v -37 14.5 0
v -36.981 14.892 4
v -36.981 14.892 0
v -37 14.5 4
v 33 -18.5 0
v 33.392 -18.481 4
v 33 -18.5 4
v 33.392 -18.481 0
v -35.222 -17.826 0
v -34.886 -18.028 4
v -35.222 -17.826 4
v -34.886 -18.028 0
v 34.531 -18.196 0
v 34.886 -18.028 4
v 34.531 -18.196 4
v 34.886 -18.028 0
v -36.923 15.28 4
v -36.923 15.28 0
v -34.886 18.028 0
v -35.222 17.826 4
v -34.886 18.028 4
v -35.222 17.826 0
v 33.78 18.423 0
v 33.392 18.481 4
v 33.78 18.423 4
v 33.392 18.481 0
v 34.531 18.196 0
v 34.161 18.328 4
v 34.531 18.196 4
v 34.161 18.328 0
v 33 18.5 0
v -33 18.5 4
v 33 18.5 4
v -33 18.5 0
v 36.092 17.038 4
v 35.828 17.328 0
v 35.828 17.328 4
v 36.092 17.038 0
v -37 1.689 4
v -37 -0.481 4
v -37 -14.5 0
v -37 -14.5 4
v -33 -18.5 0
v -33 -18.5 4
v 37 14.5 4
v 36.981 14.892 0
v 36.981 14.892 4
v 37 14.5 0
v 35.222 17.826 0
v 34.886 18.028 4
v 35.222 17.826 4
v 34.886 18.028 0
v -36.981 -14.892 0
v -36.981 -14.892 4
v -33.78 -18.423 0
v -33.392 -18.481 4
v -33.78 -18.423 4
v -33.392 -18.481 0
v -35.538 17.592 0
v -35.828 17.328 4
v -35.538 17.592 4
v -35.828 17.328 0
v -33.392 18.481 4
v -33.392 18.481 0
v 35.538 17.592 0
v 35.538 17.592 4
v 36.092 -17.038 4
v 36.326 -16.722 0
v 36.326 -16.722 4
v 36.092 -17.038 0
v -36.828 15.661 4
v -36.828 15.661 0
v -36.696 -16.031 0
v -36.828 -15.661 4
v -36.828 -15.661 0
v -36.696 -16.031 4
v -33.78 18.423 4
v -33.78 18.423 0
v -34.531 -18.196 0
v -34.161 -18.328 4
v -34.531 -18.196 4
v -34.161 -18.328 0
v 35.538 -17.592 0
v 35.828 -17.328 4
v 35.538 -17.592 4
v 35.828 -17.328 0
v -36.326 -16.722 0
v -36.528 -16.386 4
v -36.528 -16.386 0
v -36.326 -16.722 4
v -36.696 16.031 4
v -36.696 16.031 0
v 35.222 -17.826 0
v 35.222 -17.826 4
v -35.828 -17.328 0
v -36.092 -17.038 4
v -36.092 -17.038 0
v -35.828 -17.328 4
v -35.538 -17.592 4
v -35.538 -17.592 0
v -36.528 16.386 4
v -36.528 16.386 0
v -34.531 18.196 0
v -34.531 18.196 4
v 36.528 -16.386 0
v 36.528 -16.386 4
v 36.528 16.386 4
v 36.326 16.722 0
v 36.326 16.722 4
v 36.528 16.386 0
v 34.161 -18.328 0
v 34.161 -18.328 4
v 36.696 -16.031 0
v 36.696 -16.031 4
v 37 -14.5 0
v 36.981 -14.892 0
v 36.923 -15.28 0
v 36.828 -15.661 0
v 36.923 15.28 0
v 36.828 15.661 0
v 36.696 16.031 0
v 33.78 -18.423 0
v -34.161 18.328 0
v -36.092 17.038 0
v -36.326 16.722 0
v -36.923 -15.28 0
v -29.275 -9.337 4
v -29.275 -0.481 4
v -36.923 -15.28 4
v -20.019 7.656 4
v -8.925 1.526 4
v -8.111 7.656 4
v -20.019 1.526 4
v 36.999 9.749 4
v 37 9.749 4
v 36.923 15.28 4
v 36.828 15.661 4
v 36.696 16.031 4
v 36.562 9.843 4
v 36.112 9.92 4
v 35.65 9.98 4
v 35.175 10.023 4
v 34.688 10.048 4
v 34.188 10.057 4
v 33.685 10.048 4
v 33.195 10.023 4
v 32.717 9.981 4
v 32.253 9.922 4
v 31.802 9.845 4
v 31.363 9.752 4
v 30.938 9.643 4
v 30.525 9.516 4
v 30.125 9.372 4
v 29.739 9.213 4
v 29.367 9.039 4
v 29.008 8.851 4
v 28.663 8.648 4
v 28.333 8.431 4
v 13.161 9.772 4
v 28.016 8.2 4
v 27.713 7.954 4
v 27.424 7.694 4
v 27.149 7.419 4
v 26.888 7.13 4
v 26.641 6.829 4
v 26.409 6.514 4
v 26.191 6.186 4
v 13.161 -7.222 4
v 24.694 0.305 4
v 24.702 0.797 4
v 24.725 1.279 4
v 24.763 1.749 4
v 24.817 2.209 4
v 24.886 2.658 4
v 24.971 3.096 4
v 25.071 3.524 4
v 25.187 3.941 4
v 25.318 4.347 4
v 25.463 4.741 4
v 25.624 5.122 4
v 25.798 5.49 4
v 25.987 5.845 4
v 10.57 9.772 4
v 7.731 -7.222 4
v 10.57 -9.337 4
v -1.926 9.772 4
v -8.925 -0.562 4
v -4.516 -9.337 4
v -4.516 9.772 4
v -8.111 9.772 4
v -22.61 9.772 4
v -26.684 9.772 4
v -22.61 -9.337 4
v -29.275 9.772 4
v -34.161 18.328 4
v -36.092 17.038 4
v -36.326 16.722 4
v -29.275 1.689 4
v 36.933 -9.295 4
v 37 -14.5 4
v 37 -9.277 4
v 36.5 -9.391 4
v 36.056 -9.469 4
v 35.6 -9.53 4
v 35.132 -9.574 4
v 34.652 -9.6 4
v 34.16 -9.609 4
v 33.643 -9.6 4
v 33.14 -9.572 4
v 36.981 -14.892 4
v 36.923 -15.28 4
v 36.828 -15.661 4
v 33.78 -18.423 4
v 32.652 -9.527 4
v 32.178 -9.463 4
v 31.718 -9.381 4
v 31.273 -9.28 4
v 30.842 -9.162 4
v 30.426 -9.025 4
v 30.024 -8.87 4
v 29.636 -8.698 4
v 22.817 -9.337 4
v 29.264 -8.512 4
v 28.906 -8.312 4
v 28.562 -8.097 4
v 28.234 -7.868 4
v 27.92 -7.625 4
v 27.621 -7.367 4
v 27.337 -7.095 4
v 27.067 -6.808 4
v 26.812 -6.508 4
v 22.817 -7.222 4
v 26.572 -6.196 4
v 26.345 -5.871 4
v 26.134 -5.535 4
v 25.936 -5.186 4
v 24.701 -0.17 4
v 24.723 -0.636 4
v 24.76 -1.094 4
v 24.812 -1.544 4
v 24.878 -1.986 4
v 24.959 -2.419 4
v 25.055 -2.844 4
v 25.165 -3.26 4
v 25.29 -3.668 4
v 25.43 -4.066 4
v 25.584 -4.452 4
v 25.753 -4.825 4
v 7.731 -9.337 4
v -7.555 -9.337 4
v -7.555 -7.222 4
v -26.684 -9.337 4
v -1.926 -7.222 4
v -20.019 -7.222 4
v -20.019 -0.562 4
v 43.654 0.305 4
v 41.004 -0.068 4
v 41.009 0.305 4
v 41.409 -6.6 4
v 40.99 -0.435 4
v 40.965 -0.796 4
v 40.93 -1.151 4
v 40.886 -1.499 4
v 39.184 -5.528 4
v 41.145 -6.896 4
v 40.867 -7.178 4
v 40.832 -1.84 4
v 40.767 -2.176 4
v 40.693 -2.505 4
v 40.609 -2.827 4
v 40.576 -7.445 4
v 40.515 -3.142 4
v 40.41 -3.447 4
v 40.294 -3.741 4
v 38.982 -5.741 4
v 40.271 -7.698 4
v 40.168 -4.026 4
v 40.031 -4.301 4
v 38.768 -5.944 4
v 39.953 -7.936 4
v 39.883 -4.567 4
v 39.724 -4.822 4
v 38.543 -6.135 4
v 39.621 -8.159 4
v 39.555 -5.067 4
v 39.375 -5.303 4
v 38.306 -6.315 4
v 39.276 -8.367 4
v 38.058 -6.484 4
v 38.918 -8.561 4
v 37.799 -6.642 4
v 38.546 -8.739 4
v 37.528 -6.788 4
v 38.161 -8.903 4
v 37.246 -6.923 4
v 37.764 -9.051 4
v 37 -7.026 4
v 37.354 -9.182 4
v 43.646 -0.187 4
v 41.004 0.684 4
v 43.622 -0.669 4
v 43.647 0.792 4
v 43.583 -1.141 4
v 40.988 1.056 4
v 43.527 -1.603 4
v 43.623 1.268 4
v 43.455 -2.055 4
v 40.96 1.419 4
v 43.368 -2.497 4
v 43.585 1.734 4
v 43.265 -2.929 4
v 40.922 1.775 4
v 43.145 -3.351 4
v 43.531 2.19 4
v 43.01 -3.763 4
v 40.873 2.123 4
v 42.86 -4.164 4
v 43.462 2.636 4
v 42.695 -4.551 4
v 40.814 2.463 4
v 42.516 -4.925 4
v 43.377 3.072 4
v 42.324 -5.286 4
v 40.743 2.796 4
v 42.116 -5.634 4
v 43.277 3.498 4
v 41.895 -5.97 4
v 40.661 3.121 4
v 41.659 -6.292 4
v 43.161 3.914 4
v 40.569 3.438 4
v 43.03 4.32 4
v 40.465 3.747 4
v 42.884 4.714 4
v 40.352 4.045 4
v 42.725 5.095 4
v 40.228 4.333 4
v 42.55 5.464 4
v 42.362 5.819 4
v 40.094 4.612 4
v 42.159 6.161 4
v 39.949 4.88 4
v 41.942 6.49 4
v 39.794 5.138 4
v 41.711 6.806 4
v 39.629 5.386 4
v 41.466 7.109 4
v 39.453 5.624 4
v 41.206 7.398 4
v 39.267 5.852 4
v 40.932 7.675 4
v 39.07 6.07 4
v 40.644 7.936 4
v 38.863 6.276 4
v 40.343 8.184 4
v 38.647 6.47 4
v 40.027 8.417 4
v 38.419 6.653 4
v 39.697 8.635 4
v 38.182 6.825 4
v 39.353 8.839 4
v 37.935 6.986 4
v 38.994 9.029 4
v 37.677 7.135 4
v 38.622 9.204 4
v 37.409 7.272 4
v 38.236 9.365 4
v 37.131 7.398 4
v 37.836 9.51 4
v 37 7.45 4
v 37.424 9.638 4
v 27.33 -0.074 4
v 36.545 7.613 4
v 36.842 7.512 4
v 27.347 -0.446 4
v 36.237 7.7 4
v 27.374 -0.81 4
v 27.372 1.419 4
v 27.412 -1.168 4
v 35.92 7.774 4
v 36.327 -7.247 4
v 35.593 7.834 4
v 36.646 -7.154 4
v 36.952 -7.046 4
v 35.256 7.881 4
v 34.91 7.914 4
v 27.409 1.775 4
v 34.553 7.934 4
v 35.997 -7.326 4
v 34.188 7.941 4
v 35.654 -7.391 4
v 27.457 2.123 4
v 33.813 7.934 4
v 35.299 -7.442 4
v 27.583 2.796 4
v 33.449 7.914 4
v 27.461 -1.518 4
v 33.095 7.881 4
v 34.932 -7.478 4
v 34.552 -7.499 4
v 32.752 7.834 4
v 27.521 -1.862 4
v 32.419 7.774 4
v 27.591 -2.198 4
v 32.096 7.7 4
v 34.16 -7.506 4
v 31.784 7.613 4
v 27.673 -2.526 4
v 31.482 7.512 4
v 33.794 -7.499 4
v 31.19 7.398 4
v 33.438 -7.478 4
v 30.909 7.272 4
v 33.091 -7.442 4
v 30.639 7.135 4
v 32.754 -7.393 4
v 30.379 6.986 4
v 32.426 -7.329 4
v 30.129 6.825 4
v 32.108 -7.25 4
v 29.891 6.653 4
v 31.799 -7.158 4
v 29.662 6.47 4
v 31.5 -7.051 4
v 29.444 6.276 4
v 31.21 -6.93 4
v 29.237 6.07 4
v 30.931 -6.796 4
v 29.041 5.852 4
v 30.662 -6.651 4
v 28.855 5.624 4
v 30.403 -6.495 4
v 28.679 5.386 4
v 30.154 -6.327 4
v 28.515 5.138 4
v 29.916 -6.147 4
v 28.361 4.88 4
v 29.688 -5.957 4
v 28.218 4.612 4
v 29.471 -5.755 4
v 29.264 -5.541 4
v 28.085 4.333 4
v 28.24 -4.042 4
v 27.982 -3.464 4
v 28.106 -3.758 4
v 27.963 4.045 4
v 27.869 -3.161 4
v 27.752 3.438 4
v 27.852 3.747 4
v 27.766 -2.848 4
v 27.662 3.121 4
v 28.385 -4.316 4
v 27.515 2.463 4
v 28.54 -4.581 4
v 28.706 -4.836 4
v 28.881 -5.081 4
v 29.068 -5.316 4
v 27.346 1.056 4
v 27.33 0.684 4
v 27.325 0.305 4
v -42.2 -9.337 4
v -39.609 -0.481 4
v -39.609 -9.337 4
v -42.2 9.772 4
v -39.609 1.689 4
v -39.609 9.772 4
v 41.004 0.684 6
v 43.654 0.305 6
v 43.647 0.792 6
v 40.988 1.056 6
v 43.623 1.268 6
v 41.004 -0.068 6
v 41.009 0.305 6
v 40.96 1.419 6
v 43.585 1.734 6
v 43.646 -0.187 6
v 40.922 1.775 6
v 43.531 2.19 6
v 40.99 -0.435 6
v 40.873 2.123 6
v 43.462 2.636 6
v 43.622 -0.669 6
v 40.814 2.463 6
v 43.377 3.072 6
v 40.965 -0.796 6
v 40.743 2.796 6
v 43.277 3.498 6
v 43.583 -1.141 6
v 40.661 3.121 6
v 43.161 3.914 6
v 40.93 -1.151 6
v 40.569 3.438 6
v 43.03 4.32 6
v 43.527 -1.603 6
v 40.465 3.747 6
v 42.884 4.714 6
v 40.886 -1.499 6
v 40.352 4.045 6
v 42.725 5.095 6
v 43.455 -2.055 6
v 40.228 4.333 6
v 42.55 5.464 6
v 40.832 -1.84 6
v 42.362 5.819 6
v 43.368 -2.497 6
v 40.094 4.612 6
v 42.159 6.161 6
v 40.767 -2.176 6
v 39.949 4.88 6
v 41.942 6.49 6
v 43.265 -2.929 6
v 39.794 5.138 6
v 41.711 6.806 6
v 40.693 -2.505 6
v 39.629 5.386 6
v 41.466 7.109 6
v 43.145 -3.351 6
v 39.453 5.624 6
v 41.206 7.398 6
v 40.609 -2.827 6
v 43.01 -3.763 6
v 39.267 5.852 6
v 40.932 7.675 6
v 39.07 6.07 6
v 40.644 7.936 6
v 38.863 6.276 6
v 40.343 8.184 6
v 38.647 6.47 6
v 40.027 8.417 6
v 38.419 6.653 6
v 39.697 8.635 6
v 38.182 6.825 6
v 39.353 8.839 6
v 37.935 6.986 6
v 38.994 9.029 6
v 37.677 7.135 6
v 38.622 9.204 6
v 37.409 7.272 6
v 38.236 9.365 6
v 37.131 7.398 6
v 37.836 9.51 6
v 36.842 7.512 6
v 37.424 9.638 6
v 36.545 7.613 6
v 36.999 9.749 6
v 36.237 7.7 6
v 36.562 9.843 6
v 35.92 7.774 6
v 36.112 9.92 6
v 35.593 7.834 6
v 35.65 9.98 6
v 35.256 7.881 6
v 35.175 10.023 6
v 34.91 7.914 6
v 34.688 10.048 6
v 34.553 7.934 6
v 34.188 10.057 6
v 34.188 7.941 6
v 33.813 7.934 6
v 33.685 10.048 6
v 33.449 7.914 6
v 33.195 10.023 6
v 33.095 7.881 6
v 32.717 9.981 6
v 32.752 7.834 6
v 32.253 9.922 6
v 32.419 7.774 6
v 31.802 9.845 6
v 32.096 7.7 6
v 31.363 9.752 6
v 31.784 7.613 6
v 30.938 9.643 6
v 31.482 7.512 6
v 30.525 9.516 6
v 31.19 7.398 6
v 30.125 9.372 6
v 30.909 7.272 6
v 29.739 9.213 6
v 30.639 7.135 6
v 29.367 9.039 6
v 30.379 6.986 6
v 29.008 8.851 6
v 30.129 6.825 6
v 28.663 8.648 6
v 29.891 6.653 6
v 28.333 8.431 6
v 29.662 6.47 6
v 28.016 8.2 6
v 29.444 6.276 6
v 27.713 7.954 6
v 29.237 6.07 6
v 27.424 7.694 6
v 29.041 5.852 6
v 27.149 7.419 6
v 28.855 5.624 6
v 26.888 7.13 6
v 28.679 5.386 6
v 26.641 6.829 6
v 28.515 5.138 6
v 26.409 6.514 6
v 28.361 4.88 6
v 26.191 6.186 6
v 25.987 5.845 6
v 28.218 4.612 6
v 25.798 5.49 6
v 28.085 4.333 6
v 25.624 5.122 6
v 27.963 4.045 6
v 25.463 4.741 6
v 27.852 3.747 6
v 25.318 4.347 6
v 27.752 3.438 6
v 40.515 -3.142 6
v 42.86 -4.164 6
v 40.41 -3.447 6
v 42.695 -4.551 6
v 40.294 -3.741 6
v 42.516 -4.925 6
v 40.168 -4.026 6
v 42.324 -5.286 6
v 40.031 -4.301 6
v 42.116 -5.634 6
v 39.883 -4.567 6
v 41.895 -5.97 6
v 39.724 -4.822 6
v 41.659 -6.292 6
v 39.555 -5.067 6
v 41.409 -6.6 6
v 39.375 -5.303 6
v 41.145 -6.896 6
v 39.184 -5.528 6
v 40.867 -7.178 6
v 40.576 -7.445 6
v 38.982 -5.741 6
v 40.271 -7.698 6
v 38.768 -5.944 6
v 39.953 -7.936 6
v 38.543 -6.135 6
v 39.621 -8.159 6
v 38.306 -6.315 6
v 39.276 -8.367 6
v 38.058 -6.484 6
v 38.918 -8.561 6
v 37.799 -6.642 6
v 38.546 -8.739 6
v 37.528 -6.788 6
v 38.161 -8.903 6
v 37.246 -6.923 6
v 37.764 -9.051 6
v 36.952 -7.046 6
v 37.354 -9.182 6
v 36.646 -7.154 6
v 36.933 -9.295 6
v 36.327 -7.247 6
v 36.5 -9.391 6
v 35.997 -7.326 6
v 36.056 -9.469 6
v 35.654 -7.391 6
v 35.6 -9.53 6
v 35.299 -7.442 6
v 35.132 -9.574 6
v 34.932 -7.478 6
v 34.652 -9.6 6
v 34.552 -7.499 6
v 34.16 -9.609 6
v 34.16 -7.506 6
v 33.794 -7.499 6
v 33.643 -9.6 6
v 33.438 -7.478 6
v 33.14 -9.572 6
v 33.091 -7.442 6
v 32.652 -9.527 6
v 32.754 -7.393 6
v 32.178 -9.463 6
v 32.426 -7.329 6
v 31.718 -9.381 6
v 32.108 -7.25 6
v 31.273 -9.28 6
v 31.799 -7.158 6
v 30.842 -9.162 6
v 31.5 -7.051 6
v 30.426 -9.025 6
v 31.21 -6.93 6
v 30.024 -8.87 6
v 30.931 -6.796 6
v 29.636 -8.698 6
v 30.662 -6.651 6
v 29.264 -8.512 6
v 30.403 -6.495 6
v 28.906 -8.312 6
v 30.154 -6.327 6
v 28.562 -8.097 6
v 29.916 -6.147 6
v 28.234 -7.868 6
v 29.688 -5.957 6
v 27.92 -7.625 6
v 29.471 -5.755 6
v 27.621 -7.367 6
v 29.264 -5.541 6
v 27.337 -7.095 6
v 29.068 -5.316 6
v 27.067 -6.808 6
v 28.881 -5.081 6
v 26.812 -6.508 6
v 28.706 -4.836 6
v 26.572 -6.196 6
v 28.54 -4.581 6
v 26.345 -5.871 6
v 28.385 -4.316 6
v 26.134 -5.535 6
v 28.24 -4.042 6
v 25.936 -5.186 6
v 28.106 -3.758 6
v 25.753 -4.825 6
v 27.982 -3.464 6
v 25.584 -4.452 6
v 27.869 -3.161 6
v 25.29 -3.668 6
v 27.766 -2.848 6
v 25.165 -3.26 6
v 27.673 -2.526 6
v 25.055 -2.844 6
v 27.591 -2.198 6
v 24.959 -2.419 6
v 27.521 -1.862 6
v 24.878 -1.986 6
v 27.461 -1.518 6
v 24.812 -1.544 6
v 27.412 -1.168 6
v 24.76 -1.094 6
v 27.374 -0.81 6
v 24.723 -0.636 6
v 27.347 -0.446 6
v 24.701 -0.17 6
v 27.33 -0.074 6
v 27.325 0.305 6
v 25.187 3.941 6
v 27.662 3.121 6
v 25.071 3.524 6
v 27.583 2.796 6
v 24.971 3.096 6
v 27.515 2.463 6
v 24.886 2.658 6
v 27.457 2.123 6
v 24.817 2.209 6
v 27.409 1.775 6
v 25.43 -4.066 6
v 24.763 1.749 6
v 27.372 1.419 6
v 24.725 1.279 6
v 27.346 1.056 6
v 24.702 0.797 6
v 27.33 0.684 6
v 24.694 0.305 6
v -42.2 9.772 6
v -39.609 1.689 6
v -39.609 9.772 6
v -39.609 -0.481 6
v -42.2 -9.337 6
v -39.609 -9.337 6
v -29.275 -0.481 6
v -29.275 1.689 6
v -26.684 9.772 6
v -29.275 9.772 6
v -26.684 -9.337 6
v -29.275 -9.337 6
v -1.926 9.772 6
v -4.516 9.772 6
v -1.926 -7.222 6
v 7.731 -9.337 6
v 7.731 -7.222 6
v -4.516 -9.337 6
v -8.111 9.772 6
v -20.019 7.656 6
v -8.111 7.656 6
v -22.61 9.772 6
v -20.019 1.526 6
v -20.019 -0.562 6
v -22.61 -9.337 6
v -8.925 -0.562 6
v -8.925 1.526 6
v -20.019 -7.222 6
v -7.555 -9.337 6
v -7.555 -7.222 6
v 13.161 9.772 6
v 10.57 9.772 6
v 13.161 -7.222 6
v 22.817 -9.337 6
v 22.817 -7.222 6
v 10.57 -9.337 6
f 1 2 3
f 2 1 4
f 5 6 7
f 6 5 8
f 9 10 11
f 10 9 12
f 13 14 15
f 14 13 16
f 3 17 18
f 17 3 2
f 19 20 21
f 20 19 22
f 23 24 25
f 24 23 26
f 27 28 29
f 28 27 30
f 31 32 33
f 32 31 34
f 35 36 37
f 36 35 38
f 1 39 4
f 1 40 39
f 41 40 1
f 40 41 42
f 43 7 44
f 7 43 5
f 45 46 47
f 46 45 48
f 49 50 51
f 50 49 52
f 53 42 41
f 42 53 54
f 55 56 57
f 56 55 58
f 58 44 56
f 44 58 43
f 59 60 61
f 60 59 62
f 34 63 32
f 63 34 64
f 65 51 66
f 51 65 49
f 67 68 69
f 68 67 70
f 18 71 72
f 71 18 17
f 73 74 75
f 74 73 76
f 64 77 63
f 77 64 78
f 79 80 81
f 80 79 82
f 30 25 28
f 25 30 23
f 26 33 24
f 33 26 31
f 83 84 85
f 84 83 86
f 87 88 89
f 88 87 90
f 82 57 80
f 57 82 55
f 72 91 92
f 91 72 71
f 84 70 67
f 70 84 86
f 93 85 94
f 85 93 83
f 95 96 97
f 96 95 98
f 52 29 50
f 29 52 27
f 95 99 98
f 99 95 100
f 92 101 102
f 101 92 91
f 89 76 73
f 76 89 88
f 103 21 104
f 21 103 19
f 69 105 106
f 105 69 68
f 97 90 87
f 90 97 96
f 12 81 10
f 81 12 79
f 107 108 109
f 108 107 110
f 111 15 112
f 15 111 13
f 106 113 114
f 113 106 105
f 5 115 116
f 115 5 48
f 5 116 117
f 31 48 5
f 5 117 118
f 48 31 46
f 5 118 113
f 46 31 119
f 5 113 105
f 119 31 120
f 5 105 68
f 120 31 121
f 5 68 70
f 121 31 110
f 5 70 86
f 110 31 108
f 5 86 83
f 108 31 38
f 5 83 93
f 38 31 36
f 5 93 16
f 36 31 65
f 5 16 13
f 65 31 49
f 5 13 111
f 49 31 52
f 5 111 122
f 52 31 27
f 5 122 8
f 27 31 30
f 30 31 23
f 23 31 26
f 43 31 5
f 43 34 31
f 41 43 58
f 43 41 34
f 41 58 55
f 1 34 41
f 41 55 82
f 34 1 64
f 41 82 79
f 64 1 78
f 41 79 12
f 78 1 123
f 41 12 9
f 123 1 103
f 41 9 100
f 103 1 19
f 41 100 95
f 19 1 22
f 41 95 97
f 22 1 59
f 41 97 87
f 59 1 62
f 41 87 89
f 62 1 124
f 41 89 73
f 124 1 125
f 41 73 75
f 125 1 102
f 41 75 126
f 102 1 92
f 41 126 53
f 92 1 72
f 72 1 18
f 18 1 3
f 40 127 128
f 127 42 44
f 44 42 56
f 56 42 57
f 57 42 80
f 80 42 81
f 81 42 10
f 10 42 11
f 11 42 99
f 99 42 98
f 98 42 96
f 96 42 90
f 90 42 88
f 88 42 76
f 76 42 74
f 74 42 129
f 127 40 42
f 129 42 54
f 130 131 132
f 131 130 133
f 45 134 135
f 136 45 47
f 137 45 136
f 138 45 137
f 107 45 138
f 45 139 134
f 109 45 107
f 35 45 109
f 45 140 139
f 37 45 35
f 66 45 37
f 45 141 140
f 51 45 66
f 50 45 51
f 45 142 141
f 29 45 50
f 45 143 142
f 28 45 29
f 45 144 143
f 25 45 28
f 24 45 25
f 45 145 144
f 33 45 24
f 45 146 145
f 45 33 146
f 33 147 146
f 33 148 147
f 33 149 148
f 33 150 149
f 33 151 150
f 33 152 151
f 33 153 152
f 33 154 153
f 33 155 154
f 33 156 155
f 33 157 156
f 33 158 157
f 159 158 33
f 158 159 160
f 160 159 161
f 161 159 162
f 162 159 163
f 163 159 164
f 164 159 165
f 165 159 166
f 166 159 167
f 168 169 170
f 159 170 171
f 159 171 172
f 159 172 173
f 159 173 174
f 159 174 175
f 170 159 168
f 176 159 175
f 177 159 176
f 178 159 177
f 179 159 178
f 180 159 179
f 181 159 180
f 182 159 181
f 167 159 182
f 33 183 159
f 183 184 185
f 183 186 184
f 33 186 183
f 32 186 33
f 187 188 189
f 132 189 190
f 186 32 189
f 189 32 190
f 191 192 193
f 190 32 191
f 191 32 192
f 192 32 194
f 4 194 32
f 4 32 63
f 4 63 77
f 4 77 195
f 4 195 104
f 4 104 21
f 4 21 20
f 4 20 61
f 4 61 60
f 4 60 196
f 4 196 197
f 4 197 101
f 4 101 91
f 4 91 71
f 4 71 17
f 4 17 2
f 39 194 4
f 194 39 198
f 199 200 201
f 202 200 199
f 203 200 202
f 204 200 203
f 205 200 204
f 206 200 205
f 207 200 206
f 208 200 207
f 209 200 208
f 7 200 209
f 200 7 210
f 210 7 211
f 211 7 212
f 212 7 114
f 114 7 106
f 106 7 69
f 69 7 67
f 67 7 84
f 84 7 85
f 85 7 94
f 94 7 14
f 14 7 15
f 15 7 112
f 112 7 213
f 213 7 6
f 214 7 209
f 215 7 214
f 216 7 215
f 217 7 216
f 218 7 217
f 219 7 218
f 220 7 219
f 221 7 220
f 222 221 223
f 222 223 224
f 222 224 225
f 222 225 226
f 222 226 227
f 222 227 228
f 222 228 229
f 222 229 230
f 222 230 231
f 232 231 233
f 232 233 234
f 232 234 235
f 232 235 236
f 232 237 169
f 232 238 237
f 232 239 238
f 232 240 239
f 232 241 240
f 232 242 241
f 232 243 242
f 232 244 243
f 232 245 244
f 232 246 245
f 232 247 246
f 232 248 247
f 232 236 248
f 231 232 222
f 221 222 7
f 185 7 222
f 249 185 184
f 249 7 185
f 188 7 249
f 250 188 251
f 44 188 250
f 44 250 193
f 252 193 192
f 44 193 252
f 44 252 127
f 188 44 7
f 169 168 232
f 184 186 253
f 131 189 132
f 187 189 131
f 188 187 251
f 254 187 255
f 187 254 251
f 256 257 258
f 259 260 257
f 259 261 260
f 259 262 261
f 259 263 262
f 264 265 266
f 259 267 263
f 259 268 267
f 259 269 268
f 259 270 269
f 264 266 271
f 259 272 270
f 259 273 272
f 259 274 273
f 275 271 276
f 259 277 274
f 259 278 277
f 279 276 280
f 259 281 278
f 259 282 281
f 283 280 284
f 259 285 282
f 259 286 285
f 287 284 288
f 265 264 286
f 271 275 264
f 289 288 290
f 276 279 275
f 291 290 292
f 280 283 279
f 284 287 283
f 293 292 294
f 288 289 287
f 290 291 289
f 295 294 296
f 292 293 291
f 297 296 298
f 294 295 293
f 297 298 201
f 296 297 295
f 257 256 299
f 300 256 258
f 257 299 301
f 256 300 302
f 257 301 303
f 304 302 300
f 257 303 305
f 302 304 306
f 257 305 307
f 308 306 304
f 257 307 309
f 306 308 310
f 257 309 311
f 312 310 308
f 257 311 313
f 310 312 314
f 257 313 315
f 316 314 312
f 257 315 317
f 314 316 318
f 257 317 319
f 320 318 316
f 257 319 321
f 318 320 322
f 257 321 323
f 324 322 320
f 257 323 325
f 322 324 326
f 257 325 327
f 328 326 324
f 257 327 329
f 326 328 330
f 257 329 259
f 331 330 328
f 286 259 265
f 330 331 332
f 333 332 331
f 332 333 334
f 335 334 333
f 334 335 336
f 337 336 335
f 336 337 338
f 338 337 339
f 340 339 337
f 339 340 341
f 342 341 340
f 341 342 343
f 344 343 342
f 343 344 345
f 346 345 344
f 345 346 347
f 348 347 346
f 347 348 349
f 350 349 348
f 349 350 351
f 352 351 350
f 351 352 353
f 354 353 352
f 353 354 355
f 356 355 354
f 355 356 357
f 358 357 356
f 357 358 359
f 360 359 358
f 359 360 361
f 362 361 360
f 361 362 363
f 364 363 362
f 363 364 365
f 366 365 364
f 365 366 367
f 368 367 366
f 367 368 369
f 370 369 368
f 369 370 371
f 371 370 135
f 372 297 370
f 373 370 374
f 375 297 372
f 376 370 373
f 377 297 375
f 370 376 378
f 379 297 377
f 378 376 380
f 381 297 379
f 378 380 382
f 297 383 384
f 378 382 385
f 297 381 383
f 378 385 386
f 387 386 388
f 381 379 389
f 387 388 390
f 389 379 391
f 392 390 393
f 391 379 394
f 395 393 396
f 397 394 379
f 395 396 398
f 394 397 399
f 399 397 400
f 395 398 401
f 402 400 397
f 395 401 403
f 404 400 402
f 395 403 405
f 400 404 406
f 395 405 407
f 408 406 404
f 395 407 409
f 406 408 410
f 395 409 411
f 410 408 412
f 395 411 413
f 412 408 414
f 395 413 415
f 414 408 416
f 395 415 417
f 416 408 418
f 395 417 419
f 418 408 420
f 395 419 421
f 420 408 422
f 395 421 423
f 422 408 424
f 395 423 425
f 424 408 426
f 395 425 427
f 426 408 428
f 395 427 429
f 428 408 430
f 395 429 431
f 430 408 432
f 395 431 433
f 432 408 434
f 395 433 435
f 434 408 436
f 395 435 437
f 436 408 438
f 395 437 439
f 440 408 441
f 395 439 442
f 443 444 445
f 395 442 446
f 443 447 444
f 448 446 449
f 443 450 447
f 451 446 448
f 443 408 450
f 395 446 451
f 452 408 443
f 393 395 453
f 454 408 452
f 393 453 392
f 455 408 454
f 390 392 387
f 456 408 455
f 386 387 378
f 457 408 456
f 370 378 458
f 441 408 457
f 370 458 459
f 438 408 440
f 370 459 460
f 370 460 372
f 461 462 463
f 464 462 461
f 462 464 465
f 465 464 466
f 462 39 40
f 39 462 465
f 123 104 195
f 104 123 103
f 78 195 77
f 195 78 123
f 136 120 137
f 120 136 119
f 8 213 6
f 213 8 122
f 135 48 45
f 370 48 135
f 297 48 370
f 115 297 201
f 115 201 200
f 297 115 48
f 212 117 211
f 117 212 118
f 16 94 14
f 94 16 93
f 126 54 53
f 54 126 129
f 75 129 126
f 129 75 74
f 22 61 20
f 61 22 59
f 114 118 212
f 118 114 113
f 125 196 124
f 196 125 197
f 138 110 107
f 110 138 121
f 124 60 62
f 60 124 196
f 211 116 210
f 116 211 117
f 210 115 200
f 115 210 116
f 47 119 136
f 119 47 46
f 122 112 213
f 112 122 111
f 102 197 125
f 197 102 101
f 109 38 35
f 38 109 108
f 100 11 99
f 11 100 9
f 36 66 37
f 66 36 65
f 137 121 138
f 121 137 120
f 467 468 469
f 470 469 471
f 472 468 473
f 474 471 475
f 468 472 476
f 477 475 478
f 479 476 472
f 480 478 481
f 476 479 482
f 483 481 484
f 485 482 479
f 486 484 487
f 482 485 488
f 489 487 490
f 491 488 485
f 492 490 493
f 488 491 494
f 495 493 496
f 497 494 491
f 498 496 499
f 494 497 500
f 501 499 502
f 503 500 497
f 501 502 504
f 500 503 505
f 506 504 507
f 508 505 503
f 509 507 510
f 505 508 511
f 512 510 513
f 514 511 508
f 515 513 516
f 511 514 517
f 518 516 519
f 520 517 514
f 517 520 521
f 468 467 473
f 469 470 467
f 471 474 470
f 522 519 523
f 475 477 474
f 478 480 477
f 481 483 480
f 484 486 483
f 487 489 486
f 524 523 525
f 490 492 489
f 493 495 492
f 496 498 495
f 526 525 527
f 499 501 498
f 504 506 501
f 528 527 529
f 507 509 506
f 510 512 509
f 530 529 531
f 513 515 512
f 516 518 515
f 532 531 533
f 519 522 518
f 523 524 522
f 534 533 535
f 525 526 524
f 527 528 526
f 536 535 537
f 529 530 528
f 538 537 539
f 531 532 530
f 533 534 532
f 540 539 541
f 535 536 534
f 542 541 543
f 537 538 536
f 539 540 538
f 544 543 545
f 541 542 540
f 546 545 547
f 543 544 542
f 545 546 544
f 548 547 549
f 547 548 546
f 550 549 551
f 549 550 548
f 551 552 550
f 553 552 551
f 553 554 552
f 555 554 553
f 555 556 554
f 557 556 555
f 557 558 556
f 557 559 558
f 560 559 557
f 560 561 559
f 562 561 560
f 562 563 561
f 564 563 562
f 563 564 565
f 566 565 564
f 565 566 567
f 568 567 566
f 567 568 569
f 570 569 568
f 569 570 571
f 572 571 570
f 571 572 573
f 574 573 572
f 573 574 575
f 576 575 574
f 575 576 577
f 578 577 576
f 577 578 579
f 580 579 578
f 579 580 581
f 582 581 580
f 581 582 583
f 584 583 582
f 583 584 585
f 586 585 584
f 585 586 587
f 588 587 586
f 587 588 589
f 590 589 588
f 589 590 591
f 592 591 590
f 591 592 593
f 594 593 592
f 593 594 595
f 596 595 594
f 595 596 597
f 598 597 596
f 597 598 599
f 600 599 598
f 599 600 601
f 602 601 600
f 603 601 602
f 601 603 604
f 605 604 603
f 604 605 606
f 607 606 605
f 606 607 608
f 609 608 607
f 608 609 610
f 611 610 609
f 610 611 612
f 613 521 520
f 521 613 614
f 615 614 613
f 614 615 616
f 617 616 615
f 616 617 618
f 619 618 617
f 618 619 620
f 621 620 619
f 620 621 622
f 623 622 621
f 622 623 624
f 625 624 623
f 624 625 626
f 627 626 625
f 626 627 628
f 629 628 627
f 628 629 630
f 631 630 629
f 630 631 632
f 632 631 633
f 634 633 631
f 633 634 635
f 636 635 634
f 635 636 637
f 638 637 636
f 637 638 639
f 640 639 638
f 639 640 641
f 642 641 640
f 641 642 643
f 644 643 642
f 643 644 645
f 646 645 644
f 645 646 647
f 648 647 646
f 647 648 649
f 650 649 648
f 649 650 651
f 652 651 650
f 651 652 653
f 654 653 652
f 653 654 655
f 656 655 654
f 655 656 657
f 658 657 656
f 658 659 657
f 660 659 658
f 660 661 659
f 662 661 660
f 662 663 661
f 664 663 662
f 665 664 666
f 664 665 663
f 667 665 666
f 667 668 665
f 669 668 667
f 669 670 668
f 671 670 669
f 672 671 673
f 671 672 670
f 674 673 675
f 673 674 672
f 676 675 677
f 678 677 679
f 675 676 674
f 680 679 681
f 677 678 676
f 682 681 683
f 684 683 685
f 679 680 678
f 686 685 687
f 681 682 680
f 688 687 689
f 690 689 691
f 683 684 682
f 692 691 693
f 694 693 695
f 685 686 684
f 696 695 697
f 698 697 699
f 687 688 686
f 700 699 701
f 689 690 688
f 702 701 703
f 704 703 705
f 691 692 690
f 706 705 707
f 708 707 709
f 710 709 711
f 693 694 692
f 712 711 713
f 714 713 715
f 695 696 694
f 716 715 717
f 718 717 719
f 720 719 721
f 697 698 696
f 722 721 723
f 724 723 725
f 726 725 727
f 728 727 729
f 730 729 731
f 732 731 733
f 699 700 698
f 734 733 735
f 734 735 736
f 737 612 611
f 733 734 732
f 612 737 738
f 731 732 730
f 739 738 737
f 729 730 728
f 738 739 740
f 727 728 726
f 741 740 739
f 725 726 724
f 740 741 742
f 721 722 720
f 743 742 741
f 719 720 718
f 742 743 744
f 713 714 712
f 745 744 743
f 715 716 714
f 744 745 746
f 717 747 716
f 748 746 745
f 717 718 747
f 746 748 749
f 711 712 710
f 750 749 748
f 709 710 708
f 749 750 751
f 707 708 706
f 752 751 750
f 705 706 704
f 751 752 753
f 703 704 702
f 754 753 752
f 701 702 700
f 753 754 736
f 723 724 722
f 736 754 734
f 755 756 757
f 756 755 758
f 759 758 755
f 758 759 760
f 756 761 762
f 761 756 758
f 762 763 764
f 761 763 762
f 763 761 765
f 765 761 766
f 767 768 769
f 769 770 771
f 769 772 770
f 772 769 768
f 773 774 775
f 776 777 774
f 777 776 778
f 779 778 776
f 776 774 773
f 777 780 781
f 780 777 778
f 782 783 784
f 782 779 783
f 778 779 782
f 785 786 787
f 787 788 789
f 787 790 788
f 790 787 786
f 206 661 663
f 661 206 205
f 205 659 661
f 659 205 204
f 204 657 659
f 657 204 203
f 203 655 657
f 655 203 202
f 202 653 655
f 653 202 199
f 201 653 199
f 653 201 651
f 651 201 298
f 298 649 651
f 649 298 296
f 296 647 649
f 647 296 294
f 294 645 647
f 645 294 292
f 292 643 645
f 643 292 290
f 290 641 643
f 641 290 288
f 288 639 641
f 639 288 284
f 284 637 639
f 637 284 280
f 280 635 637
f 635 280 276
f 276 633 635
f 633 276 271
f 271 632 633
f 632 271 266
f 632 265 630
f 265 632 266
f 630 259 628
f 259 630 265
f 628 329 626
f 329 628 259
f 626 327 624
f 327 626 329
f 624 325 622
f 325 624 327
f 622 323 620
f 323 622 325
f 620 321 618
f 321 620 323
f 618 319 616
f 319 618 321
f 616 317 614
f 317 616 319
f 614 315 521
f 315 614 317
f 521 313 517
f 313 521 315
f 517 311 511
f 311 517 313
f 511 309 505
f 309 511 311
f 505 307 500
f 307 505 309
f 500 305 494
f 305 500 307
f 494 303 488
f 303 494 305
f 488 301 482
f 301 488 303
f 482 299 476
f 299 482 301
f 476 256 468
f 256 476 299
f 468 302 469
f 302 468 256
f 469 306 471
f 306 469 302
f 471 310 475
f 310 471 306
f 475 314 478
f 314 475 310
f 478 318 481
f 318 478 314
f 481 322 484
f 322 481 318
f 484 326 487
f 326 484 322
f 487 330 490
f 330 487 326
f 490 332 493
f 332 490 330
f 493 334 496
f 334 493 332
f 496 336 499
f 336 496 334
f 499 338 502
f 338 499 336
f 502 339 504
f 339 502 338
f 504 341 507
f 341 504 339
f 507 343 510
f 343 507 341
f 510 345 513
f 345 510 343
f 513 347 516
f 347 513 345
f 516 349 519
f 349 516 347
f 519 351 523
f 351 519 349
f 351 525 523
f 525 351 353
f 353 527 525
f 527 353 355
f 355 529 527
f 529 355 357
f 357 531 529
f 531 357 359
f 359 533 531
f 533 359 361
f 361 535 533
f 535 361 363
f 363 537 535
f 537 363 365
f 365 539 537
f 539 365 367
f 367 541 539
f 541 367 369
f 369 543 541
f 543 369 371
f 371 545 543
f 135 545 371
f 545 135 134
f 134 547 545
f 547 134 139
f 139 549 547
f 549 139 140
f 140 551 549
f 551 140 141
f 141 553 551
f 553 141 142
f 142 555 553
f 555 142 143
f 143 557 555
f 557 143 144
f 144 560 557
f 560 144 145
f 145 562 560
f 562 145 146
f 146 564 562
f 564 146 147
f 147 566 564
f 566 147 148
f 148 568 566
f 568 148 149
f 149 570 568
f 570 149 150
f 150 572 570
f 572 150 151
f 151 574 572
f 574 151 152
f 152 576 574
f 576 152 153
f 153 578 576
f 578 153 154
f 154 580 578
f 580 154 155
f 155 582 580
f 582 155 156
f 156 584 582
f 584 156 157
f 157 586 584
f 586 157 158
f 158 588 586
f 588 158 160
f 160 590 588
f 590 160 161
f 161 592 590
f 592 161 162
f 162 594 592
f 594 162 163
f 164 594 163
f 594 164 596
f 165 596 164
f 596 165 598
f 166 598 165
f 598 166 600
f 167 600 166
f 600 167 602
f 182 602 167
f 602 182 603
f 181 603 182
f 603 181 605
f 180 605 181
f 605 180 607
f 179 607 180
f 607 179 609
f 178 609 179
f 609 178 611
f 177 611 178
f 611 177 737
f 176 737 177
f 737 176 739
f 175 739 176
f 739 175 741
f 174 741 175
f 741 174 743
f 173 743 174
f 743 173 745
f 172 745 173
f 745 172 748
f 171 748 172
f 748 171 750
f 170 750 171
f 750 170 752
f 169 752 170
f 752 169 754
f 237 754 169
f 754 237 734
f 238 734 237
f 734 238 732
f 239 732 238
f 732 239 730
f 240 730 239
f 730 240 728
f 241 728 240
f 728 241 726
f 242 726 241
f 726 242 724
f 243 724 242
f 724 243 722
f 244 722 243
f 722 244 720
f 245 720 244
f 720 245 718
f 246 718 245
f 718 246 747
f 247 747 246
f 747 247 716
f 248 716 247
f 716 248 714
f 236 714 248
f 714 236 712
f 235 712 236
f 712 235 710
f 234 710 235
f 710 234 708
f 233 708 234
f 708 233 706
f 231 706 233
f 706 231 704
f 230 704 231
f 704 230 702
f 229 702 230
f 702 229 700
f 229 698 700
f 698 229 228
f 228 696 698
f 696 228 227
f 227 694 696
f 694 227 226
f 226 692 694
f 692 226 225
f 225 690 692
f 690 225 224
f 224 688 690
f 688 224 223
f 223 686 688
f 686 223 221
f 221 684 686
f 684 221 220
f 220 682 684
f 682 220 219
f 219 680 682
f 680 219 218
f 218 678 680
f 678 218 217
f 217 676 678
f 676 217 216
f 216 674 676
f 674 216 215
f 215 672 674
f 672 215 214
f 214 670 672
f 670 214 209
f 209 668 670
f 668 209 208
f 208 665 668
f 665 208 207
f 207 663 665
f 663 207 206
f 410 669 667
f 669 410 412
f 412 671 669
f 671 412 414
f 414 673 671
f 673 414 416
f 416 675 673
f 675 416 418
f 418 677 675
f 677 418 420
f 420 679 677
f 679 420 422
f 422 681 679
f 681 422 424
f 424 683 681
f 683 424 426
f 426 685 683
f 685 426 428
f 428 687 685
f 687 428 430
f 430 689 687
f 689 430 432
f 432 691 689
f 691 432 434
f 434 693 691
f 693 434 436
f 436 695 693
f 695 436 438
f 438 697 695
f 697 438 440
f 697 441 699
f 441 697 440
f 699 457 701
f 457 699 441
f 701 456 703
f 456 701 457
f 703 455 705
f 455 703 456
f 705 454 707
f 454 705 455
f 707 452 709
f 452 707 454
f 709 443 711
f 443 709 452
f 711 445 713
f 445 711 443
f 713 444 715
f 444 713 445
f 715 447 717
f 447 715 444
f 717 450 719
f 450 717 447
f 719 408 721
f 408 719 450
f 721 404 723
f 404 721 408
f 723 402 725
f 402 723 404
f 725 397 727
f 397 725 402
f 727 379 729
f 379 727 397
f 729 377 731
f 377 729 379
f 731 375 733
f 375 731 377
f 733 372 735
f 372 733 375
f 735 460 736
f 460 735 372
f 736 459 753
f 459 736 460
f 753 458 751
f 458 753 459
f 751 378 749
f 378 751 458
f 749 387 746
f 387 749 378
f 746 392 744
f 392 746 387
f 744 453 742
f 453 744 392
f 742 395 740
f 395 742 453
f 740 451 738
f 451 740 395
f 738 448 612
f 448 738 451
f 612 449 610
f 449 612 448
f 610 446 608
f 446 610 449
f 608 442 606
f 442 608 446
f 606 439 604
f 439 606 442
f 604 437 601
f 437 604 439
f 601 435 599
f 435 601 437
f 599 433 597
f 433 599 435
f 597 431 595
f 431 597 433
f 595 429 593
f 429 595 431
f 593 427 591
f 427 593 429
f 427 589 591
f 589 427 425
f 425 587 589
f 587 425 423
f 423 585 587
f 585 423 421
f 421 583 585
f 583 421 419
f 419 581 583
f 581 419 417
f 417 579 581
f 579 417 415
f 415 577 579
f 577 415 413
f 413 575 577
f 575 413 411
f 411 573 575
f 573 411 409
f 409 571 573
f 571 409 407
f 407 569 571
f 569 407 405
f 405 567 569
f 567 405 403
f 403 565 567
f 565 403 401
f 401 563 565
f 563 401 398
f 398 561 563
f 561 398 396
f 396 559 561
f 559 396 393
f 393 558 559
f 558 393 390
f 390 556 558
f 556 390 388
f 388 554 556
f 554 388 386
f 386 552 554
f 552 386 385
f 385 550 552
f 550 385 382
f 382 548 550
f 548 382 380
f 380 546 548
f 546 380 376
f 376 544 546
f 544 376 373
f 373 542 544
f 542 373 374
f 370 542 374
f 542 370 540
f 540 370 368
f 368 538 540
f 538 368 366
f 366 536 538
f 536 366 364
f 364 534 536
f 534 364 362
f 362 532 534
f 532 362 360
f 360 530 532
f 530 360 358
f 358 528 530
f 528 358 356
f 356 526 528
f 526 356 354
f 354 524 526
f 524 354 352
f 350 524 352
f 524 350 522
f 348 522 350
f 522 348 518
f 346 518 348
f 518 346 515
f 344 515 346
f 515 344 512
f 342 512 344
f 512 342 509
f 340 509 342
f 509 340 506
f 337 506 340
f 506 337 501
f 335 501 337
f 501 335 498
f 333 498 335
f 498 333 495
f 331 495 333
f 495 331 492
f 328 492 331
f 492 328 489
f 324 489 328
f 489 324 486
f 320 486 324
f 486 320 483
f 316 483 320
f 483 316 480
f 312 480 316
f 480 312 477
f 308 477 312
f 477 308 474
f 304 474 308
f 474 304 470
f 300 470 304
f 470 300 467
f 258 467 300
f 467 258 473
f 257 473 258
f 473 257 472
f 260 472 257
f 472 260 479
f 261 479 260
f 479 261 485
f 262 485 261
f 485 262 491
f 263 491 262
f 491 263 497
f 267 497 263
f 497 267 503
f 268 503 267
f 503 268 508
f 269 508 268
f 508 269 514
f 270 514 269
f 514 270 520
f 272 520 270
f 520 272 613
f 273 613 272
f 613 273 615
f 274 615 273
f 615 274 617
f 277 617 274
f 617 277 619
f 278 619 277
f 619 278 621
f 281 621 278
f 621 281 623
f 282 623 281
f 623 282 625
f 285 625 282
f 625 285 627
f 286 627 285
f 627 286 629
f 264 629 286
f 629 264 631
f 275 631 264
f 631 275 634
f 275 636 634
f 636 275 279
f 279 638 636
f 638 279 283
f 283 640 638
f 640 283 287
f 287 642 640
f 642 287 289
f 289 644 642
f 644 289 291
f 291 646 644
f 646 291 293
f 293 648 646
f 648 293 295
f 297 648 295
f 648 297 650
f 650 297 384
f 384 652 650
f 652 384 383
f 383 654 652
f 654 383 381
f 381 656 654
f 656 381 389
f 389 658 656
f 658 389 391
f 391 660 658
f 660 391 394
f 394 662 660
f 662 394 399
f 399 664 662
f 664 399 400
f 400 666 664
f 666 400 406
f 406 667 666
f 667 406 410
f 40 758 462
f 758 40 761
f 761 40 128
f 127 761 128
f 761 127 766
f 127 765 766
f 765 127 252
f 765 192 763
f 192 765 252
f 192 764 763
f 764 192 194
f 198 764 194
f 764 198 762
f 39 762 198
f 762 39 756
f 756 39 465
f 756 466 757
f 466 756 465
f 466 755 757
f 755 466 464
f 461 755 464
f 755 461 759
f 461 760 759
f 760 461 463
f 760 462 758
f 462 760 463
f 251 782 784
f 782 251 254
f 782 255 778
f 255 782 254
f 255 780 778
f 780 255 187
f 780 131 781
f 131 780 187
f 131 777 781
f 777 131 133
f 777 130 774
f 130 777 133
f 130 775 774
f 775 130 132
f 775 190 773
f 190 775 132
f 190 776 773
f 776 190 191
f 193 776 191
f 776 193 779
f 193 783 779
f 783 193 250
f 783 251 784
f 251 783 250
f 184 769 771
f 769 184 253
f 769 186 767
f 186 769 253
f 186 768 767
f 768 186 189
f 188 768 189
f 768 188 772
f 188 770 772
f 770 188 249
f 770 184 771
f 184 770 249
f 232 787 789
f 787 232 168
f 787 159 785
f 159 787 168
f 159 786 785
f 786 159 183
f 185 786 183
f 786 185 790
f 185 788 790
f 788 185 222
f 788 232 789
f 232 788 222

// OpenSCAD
// Text-to-3D-rectangle (plaque) generator for OpenSCAD
// Creates a rectangular plate sized from the text, then embosses or engraves the text.

/****************************
 * User parameters
 ****************************/
message = "HELLO";       // text to place on the plaque
font = "Liberation Sans"; // any installed font name
size = 20;                 // text point size (OpenSCAD units)
letter_spacing = 1.0;      // spacing multiplier between letters

// Plate sizing: set explicit width/height, or leave 0 for auto estimate
plate_width = 0;           // 0 = auto width based on message length
plate_height = 0;          // 0 = auto height based on text size
margin = 6;                // margin around text on all sides
corner_radius = 4;         // rounded plate corners (0 for sharp)

plate_thickness = 4;       // thickness of the base plate
text_depth = 2;            // emboss/engrave depth
text_mode = "emboss";     // "emboss" or "engrave"

halign = "center";        // text alignment: left|center|right
valign = "center";        // text vertical alignment: top|center|baseline|bottom
$fn = 64;

// International text layout (set these for Arabic or other scripts)
// For Arabic examples: font="Noto Naskh Arabic" (or "Amiri"), language="ar", script="arabic", direction="rtl"
language = "en";          // e.g., "ar" for Arabic
script = "latin";         // e.g., "arabic"
direction = "ltr";        // "ltr" (left-to-right), "rtl" (right-to-left), or "ttb"

/****************************
 * Helpers
 ****************************/
// Rough width/height estimate (no true bbox in OpenSCAD). Adjust factors for your font.
char_factor = 0.62;        // average width per character relative to size
height_factor = 1.25;      // text block height relative to size

function auto_w(msg, size, margin) = len(msg) * size * char_factor + 2 * margin;
function auto_h(size, margin) = size * height_factor + 2 * margin;

module rounded_rect_2d(w, h, r) {
    if (r <= 0) square([w, h], center=true);
    else offset(r=r) square([w - 2*r, h - 2*r], center=true);
}

module plate(w, h, t, r) {
    linear_extrude(height=t) rounded_rect_2d(w, h, r);
}

module text3d(msg, size, depth, font, halign, valign, spacing=1.0, language="en", script="latin", direction="ltr") {
    linear_extrude(height=depth)
        text(msg,
             size=size,
             font=font,
             halign=halign,
             valign=valign,
             spacing=spacing,
             language=language,
             script=script,
             direction=direction);
}

/****************************
 * Assembly
 ****************************/
module text_plate() {
    w = plate_width > 0 ? plate_width : auto_w(message, size, margin);
    h = plate_height > 0 ? plate_height : auto_h(size, margin);

    if (text_mode == "emboss") {
        union() {
            plate(w, h, plate_thickness, corner_radius);
            // place text on the top surface
            translate([0, 0, plate_thickness])
                text3d(message, size, text_depth, font, halign, valign, letter_spacing, language, script, direction);
        }
    } else if (text_mode == "engrave") {
        difference() {
            plate(w, h, plate_thickness, corner_radius);
            // subtract text into the top face
            translate([0, 0, plate_thickness - text_depth])
                text3d(message, size, text_depth, font, halign, valign, letter_spacing, language, script, direction);
        }
    } else {
        plate(w, h, plate_thickness, corner_radius);
    }
}

// Render
text_plate();
